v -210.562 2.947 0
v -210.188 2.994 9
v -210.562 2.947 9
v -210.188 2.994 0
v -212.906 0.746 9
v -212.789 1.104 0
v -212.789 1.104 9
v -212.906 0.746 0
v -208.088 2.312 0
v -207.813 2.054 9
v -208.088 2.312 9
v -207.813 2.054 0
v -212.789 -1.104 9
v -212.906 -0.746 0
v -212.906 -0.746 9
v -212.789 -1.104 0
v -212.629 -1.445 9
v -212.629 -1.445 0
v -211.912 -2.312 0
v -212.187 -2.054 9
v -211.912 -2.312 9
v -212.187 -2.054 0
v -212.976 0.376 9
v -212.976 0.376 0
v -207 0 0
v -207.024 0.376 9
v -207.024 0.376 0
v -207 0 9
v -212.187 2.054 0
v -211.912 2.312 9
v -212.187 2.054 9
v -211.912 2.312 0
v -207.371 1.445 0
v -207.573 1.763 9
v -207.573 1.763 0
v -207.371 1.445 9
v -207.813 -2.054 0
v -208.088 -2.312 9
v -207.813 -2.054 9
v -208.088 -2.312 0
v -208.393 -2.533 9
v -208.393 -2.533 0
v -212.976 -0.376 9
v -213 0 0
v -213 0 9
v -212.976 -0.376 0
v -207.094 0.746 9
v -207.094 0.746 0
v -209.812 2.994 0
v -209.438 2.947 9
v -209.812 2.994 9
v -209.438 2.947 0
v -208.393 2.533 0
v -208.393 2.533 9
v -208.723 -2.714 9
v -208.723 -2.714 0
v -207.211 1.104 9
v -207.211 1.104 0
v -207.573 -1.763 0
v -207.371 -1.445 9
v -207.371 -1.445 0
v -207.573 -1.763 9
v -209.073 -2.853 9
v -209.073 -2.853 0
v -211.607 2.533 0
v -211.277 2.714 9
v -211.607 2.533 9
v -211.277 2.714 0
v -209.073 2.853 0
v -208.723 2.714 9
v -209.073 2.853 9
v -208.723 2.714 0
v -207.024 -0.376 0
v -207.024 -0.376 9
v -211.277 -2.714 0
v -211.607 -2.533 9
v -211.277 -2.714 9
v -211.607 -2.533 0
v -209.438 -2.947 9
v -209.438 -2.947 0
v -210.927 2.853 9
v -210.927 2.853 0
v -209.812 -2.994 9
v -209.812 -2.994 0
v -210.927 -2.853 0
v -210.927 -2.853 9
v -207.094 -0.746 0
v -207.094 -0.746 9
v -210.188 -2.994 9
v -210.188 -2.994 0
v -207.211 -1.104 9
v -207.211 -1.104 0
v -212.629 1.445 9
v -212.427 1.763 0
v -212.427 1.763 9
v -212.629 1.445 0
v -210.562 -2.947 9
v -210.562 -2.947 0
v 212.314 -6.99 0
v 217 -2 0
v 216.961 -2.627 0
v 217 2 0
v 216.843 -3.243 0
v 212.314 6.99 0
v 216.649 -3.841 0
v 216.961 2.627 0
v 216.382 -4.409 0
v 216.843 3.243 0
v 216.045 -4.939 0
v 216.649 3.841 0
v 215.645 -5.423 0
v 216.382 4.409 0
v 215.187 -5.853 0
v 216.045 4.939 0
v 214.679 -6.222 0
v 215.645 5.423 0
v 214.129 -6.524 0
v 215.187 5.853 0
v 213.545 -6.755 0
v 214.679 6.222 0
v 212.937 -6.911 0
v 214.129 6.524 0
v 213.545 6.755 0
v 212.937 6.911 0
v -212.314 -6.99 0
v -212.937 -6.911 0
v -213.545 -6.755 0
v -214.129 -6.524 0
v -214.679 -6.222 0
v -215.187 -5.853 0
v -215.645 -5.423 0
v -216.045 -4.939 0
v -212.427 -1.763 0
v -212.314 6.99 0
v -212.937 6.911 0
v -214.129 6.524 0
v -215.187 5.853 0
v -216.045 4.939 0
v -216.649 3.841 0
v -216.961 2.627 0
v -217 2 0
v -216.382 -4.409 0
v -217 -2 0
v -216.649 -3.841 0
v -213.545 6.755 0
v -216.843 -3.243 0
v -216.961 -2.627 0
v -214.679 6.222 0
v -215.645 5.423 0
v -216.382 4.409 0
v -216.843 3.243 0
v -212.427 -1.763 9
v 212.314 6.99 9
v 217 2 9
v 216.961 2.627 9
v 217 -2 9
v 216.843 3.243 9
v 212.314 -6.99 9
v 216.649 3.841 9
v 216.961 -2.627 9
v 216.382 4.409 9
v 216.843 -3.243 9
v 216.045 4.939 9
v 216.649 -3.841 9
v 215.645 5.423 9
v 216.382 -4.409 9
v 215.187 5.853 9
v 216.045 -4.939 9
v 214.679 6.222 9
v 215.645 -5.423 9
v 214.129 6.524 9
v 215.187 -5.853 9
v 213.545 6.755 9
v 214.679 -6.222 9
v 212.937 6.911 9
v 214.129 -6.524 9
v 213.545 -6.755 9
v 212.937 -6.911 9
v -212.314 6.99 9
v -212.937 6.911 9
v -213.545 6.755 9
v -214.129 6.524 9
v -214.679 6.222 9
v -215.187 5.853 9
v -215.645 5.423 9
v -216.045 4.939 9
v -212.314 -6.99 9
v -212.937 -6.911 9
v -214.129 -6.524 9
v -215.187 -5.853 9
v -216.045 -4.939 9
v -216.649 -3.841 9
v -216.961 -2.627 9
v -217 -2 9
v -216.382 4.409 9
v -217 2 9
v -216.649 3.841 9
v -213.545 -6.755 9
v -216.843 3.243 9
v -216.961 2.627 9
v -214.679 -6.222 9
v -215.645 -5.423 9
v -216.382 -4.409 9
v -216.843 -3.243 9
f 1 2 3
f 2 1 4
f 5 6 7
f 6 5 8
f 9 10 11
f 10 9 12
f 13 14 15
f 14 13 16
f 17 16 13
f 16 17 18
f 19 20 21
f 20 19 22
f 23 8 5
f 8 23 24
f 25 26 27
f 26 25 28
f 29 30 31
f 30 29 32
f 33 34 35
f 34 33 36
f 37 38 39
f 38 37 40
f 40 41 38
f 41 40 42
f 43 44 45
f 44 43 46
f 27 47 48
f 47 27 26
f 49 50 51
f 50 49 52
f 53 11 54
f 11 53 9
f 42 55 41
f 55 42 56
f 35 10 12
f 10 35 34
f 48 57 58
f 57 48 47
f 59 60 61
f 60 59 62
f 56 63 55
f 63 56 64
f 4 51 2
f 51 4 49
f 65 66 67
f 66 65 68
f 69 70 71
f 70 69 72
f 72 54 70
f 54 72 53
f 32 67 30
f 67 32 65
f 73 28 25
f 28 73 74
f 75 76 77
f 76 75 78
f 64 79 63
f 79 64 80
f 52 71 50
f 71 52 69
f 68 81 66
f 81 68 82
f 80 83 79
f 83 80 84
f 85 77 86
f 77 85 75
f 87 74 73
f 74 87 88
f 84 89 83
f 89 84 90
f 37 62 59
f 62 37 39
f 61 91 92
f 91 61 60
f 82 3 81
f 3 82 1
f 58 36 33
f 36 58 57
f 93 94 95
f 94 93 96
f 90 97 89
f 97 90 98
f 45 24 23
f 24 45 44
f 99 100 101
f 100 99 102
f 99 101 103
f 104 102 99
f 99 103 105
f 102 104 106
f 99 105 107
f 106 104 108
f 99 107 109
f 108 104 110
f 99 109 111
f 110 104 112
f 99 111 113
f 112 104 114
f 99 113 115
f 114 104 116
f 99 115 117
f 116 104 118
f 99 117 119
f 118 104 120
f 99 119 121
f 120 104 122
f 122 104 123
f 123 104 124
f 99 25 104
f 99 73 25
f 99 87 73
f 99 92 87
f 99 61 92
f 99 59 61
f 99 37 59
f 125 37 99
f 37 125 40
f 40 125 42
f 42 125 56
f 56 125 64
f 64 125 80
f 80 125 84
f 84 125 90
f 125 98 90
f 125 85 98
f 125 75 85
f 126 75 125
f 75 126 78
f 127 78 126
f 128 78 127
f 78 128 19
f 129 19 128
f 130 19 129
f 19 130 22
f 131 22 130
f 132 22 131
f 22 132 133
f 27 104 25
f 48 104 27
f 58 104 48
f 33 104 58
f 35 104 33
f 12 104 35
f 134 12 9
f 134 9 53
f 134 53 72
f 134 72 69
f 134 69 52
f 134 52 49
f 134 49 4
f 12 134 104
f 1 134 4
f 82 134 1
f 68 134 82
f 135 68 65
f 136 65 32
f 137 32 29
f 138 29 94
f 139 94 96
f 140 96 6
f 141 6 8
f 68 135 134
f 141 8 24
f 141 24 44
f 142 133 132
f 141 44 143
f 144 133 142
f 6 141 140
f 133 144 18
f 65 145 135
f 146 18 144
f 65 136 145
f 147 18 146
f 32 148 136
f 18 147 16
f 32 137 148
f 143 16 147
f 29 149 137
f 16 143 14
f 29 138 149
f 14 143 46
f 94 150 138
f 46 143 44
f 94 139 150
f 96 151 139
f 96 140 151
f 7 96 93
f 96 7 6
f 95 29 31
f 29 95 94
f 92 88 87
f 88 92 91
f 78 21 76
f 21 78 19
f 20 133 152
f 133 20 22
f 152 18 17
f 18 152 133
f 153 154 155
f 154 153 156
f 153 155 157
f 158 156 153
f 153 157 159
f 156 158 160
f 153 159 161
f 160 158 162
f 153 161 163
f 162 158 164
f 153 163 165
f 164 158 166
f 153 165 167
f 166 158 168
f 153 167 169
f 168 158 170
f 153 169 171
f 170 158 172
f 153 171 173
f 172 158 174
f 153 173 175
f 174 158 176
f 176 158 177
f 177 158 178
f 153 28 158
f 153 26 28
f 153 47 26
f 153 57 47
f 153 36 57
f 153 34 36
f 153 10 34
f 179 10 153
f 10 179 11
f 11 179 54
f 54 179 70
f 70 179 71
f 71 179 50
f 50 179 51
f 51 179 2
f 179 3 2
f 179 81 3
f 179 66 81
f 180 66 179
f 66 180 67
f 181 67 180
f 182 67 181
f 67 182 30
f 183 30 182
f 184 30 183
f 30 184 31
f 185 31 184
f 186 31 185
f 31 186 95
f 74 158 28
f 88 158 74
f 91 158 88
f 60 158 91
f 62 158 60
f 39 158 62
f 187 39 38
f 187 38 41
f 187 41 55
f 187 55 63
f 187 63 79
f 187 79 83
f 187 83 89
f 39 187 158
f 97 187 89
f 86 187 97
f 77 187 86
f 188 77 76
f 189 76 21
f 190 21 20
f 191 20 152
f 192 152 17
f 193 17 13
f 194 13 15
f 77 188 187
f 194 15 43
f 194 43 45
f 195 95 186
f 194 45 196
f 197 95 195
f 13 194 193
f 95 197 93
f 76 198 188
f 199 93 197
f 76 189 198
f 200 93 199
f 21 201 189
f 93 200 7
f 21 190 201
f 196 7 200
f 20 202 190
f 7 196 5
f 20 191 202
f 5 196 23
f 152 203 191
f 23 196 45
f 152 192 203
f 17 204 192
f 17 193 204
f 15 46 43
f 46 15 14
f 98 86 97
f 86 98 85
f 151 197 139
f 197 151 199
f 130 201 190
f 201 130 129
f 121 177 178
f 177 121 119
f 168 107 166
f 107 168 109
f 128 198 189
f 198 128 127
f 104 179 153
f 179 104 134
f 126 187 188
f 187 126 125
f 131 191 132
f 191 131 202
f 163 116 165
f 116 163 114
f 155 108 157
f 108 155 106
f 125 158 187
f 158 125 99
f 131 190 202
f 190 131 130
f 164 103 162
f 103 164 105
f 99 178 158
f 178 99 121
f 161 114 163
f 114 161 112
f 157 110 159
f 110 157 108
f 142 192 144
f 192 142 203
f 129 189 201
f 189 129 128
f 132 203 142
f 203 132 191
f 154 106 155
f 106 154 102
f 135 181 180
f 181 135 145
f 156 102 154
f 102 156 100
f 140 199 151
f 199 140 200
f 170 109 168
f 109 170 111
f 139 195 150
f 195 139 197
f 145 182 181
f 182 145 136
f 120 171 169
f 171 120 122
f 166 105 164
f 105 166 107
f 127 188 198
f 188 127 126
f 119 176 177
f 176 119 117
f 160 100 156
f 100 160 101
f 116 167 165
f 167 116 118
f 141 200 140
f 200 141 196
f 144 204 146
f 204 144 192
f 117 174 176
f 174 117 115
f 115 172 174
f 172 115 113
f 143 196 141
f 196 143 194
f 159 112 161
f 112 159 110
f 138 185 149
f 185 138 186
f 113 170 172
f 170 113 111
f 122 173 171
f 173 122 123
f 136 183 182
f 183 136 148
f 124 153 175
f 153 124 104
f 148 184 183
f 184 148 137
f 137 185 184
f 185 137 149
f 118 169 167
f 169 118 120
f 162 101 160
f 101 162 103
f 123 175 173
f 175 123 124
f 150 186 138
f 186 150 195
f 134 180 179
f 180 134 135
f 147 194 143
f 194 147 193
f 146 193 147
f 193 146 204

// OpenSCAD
$fn = 50;


difference() {
	union() {
		hull() {
			translate(v = [-212.0000000000, 2.0000000000, 0]) {
				cylinder(h = 9, r = 5);
			}
			translate(v = [212.0000000000, 2.0000000000, 0]) {
				cylinder(h = 9, r = 5);
			}
			translate(v = [-212.0000000000, -2.0000000000, 0]) {
				cylinder(h = 9, r = 5);
			}
			translate(v = [212.0000000000, -2.0000000000, 0]) {
				cylinder(h = 9, r = 5);
			}
		}
	}
	union() {
		translate(v = [-210.0000000000, 0.0000000000, 0]) {
			cylinder(h = 9, r = 3.0000000000);
		}
		translate(v = [-210.0000000000, 0.0000000000, 0]) {
			cylinder(h = 9, r = 1.5000000000);
		}
		translate(v = [-210.0000000000, 0.0000000000, 0]) {
			cylinder(h = 9, r = 1.5000000000);
		}
		translate(v = [-210.0000000000, 0.0000000000, 0]) {
			cylinder(h = 9, r = 1.5000000000);
		}
	}
}
